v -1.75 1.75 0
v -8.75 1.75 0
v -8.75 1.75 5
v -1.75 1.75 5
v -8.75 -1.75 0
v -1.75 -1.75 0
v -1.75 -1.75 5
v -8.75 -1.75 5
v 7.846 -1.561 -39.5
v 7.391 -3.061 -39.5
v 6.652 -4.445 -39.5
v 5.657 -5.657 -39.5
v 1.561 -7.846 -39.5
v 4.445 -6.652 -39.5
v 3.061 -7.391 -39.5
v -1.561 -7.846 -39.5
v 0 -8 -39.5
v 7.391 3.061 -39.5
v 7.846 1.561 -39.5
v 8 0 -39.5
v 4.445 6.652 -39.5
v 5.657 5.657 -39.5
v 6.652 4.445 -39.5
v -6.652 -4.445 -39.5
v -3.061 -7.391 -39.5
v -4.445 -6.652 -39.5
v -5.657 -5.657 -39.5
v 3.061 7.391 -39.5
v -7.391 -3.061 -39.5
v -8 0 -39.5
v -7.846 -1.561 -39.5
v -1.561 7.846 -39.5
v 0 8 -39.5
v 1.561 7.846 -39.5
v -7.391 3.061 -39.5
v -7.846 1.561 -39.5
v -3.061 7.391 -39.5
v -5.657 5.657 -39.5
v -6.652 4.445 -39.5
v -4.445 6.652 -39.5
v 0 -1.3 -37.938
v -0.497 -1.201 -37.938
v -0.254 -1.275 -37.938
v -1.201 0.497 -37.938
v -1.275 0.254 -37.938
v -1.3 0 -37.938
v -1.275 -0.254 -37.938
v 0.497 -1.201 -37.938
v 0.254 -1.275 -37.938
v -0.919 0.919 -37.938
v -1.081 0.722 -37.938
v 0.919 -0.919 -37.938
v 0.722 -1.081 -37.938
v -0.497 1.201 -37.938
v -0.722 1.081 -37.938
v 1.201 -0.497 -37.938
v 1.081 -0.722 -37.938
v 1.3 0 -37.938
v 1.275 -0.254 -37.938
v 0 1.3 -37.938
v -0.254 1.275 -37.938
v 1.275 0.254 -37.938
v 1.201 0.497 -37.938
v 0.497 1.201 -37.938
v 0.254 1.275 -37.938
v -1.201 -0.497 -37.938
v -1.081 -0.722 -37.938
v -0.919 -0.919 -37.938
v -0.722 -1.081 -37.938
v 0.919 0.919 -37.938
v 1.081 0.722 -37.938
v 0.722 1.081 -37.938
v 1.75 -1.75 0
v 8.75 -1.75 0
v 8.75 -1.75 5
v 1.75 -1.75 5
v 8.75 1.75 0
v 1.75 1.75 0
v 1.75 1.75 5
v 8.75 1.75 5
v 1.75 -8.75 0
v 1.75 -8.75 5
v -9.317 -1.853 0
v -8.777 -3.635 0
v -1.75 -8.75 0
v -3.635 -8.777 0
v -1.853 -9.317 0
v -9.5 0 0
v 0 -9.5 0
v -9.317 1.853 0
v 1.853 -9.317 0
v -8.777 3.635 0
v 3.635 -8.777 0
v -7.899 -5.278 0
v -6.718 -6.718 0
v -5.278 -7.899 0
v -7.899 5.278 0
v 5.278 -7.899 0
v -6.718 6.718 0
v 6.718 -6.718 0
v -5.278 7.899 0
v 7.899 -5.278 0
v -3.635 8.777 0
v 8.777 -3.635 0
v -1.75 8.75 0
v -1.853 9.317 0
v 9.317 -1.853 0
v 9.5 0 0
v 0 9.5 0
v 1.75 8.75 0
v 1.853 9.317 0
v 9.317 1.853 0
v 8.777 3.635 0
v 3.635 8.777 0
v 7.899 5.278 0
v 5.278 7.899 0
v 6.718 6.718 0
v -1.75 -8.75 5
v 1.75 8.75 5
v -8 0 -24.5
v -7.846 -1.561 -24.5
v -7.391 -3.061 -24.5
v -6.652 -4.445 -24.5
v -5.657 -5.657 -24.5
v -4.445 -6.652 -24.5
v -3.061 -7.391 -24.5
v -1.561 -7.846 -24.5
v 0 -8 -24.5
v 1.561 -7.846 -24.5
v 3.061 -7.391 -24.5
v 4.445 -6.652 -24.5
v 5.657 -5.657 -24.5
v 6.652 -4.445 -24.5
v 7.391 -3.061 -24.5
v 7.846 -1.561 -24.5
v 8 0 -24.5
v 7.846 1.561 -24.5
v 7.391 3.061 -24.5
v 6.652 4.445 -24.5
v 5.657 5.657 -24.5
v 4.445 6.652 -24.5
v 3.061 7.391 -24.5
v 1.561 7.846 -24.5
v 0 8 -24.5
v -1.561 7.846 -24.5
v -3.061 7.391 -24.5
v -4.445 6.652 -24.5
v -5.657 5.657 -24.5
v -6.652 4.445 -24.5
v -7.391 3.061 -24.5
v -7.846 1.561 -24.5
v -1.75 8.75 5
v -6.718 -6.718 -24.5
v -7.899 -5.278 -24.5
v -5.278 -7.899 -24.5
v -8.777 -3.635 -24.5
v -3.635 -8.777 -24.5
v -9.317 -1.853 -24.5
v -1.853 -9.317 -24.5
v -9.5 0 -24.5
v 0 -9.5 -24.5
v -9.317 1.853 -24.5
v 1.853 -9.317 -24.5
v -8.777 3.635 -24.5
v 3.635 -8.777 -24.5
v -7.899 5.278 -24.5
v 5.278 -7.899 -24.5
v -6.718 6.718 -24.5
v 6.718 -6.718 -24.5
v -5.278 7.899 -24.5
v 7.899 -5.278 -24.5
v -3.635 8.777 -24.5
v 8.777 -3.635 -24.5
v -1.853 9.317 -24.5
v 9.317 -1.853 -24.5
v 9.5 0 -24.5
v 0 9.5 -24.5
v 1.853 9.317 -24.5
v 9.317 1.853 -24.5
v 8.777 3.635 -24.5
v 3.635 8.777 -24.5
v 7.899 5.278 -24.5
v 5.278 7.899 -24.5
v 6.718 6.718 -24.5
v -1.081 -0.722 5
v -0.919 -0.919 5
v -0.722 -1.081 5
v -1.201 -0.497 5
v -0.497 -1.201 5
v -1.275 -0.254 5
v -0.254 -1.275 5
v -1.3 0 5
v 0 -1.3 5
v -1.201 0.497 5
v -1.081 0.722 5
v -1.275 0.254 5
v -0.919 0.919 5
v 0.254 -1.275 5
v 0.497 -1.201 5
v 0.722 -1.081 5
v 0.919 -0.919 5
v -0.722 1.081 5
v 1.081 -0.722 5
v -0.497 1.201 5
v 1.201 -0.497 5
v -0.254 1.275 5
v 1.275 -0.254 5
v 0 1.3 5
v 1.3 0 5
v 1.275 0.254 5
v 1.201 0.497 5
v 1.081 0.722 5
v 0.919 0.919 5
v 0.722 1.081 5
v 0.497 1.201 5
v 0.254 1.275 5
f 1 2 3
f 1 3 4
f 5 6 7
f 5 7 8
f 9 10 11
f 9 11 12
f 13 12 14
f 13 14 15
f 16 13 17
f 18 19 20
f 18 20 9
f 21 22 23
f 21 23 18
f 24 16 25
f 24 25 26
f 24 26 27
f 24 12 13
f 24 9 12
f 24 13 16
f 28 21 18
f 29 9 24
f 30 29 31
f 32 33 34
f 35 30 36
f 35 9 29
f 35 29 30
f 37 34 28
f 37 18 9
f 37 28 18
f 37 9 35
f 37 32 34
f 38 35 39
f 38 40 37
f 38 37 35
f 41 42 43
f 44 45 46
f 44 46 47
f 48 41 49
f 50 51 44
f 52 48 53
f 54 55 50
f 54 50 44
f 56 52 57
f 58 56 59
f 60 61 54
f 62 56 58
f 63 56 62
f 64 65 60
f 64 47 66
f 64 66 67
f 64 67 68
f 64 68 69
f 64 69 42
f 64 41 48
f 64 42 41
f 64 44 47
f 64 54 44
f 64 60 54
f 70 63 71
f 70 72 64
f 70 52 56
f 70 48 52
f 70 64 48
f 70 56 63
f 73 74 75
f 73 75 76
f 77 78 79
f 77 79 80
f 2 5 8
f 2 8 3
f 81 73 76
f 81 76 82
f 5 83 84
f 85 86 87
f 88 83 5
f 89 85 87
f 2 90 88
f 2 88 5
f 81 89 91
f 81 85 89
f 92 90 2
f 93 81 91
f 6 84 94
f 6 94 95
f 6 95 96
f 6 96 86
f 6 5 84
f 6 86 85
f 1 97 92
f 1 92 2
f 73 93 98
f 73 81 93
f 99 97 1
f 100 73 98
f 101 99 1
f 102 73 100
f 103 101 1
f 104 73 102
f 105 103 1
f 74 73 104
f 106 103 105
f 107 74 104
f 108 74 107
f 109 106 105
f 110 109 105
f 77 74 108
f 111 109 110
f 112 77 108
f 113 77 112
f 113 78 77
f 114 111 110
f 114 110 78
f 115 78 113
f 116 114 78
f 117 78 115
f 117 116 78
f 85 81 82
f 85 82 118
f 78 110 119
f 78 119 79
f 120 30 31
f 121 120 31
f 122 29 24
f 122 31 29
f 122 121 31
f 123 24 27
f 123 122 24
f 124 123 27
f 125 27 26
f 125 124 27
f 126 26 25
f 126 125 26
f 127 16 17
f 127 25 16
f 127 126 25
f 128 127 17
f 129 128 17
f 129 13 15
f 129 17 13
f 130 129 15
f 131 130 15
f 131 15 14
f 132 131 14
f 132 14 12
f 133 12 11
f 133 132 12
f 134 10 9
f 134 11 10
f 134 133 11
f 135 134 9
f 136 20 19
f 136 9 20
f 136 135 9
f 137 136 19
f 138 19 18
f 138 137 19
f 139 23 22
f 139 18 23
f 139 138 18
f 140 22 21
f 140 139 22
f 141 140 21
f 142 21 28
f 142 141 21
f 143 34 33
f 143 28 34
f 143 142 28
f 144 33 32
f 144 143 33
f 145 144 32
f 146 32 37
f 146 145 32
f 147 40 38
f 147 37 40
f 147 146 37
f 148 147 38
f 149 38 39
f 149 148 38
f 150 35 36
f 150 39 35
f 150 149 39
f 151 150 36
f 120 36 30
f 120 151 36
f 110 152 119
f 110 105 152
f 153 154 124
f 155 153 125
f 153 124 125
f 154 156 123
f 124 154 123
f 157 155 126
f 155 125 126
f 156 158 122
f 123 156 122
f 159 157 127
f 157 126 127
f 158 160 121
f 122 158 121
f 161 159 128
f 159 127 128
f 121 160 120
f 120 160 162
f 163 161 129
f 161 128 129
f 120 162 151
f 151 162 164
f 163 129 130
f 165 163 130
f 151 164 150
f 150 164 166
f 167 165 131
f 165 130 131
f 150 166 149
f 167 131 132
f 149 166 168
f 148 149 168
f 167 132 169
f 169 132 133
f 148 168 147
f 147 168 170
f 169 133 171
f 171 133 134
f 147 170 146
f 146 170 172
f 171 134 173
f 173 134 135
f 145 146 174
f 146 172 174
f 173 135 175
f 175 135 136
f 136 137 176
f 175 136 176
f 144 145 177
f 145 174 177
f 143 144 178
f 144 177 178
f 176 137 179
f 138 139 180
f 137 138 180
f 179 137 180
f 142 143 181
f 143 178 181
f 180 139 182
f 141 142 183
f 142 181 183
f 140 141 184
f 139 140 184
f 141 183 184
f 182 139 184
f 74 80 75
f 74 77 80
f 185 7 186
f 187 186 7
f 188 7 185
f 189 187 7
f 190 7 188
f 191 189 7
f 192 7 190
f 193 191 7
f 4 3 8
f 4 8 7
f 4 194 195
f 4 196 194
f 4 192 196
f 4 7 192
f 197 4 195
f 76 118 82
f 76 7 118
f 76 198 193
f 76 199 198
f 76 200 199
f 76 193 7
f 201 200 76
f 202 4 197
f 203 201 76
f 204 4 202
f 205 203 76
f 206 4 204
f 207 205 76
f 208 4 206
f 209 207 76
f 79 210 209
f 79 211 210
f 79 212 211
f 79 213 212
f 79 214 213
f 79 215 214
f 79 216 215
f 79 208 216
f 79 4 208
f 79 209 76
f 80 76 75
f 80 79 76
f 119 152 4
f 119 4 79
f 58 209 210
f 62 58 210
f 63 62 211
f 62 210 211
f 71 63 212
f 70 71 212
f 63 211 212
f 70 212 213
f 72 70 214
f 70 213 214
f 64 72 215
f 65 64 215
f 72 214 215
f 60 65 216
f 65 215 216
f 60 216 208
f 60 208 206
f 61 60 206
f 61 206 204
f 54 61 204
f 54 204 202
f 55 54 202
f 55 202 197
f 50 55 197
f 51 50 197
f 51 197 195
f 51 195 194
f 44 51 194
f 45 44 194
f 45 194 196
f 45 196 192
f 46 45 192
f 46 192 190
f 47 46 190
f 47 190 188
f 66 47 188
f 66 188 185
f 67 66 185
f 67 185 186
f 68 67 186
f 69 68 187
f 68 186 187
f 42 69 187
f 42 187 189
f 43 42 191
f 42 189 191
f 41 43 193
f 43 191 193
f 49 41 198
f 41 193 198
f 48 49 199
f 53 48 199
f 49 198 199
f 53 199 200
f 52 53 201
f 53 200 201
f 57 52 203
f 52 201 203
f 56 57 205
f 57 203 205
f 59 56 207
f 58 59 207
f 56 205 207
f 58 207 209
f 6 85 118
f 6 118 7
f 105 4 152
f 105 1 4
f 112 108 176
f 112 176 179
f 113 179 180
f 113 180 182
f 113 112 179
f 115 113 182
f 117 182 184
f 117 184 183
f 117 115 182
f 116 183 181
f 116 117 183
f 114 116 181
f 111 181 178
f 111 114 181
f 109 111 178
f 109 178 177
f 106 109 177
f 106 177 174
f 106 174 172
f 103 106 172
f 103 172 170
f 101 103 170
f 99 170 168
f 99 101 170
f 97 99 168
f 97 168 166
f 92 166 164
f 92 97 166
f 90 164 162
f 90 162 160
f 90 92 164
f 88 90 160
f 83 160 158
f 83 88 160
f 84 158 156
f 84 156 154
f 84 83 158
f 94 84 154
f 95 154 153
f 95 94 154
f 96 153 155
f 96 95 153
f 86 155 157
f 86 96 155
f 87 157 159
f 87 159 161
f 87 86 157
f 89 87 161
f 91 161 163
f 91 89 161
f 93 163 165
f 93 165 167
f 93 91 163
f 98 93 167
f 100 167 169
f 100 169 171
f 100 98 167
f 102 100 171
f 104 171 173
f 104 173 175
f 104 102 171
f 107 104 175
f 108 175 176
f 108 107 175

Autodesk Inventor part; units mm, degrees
ref_plane "YZ Plane" through (0, 0, 0) normal (1, 0, 0) x (0, 1, 0)
ref_plane "XZ Plane" through (0, 0, 0) normal (0, 1, 0) x (-1, 0, 0)
ref_plane "XY Plane" through (0, 0, 0) normal (0, 0, 1) x (1, 0, 0)
sketch "Sketch1" plane through (0, 0, 0) normal (0, 0, 1) x (1, 0, 0)
  circle A0 centre (0, 0) radius 9.5
  dimension "d0" = 19
extrude "Extrusion1" add sketch "Sketch1" against normal blind 24.5
sketch "Sketch2" plane through (0, 0, -24.5) normal (0, 0, -1) x (-1, 0, 0)
  circle A0 centre (0, 0) radius 8
  dimension "d3" = 16
extrude "Extrusion2" add sketch "Sketch2" along normal blind 15
sketch "Sketch3" plane through (0, 0, 0) normal (0, 0, 1) x (1, 0, 0)
  line L0 (0, 0) -> (0, 8.75)
  line L1 (0, 8.75) -> (1.75, 8.75)
  line L2 (1.75, 8.75) -> (1.75, 1.75)
  line L3 (1.75, 1.75) -> (8.75, 1.75)
  line L4 (8.75, 1.75) -> (8.75, -1.75)
  line L5 (8.75, -1.75) -> (1.75, -1.75)
  line L6 (1.75, -1.75) -> (1.75, -8.75)
  line L7 (1.75, -8.75) -> (-1.75, -8.75)
  line L8 (-1.75, -8.75) -> (-1.75, -1.75)
  line L9 (-1.75, -1.75) -> (-8.75, -1.75)
  line L10 (-8.75, -1.75) -> (-8.75, 1.75)
  line L11 (-8.75, 1.75) -> (-1.75, 1.75)
  line L12 (-1.75, 1.75) -> (-1.75, 8.75)
  line L13 (-1.75, 8.75) -> (0, 8.75)
  dimension "d26" = 8.75
  dimension "d27" = 1.75
  dimension "d28" = 7
  dimension "d29" = 7
  dimension "d30" = 3.5
  dimension "d31" = 7
  dimension "d33" = 7
  dimension "d34" = 3.5
  dimension "d35" = 7
  dimension "d36" = 7
  dimension "d37" = 3.5
  dimension "d38" = 7
  dimension "d39" = 7
extrude "Extrusion3" add sketch "Sketch3" along normal blind 5
sketch "Sketch4" plane through (0, 0, 5) normal (0, 0, 1) x (1, 0, 0)
  circle A0 centre (0, 0) radius 1.3
  dimension "d23" = 2.6
extrude "Extrusion4" cut sketch "Sketch4" against normal blind 42.9375
properties part number "OmniWheelAxleRear"
